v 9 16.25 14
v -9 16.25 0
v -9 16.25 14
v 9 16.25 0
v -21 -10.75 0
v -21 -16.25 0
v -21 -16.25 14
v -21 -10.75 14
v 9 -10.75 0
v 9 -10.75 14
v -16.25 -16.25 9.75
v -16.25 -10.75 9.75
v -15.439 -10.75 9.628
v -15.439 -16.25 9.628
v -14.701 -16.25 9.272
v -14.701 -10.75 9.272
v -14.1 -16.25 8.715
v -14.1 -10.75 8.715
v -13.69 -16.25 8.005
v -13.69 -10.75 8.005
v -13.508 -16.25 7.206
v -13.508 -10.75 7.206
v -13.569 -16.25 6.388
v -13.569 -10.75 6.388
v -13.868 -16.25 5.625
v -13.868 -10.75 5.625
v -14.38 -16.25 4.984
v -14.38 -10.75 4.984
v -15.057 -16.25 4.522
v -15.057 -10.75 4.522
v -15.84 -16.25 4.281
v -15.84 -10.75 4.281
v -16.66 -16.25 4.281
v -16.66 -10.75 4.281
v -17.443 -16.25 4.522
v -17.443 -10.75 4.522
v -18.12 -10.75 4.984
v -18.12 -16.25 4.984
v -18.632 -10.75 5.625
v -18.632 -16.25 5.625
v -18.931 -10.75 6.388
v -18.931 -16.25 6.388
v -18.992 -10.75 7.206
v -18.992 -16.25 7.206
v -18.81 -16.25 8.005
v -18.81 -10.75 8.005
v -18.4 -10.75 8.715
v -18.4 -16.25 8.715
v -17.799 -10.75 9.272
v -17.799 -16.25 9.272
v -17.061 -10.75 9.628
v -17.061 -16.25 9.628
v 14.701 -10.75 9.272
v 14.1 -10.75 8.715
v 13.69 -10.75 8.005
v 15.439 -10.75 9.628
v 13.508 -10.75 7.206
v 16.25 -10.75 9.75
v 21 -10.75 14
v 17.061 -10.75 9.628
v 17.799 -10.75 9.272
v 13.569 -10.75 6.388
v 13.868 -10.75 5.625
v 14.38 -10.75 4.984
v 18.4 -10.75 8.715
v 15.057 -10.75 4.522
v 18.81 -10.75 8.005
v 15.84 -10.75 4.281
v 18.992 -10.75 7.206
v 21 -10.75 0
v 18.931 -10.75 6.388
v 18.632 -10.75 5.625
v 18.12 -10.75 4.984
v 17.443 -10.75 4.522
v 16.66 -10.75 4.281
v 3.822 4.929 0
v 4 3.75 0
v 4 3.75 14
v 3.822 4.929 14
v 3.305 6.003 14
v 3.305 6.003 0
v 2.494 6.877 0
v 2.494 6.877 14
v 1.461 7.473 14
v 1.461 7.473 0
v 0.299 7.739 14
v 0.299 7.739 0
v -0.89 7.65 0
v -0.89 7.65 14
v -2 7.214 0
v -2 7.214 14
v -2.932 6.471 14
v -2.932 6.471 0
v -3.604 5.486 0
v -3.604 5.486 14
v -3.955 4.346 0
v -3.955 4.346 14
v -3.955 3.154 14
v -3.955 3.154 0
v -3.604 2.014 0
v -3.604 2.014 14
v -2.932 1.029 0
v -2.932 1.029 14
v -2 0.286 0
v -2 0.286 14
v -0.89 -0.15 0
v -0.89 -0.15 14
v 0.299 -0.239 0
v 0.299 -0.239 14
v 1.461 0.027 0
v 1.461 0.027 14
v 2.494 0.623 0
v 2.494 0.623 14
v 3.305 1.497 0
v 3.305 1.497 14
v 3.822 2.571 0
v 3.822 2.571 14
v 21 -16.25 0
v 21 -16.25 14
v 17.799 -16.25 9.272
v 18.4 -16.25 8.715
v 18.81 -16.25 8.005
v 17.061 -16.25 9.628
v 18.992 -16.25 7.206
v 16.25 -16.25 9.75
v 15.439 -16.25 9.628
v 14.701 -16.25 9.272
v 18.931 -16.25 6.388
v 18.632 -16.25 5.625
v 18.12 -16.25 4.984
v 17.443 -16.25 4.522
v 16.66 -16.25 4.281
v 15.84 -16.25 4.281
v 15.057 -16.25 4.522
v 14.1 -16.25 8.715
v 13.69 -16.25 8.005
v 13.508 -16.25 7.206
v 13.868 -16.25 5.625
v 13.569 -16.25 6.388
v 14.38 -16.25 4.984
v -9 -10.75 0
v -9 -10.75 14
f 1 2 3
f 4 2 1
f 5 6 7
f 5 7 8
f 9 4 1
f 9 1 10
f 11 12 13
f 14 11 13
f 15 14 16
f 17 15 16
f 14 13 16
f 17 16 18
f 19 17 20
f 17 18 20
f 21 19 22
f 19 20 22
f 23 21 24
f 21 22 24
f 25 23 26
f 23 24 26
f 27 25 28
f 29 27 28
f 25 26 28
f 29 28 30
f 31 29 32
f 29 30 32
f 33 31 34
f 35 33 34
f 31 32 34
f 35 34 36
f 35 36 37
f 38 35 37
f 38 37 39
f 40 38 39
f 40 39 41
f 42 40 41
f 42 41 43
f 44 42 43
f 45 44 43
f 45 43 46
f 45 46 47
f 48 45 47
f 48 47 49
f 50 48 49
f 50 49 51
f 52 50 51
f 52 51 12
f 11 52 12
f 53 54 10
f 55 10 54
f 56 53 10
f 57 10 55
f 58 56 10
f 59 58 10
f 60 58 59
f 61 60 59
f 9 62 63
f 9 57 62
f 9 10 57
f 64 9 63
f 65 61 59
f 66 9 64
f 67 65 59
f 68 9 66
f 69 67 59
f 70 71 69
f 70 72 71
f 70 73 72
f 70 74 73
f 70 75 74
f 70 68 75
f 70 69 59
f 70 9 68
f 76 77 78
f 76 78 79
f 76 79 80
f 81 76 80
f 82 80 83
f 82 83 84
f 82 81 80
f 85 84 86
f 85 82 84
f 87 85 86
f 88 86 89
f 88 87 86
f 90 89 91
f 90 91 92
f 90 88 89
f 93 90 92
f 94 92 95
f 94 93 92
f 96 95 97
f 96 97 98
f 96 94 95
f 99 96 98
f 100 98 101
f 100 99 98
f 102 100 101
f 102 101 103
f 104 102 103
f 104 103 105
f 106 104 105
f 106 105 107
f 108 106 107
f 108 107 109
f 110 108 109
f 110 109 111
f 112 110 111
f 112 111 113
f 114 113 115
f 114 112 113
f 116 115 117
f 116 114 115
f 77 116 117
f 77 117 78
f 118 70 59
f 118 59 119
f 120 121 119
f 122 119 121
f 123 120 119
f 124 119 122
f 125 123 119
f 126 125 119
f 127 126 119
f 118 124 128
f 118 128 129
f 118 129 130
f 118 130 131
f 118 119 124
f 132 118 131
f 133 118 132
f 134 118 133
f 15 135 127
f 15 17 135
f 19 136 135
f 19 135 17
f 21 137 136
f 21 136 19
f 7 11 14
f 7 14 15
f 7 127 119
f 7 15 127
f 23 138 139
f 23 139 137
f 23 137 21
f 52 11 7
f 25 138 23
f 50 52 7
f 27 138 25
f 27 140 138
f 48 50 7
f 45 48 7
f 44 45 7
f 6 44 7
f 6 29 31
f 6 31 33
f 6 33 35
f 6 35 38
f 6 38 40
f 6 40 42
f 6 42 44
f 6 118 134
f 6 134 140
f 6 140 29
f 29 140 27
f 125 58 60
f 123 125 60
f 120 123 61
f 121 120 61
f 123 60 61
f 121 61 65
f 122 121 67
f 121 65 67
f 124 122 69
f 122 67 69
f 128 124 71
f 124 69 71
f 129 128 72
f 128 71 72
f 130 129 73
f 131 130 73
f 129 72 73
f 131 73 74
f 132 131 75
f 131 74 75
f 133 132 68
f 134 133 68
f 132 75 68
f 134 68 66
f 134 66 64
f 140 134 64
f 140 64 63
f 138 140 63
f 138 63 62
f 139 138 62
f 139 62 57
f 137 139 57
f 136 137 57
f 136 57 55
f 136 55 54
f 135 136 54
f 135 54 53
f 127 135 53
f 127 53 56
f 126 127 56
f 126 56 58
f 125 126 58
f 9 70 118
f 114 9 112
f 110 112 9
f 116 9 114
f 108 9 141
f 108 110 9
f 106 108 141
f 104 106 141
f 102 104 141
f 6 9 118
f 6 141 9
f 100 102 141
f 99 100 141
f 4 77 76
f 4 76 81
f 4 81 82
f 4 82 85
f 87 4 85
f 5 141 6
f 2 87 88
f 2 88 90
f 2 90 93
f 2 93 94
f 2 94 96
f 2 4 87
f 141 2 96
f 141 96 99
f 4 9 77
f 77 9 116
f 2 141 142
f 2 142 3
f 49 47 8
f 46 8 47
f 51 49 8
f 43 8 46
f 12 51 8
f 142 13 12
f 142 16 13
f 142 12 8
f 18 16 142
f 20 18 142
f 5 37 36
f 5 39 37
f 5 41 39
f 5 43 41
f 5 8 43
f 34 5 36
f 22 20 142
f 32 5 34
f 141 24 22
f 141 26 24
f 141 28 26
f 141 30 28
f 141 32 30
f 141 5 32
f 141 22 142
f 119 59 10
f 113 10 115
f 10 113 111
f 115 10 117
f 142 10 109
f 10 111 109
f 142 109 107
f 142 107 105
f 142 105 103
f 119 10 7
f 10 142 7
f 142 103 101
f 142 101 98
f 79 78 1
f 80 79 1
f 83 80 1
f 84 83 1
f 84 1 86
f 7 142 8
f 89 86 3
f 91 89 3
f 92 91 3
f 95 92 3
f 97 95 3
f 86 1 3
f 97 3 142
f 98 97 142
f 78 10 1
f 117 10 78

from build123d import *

# Parameters (mm, degrees)
SKETCH_1_R          = 4
EXTRUDE_1_DEPTH     = 14
SKETCH_2_R          = 2.75
CUT_EXTRUDE_1_DEPTH = 14


with BuildPart() as part:
    # 草图1 → 凸台-拉伸1 (new body)
    with BuildSketch(Plane.XY):
        Polygon((-21, -10.75), (-9, -10.75), (-9, 16.25), (9, 16.25), (9, -10.75), (21, -10.75), (21, -16.25), (-21, -16.25), align=None)
        with Locations((0, 3.75)):
            Circle(SKETCH_1_R, mode=Mode.SUBTRACT)
    extrude(amount=EXTRUDE_1_DEPTH)

    # 草图2 → 切除-拉伸1 (cut)
    with BuildSketch(Plane(origin=(0, -10.75, 0), x_dir=(1, 0, 0), z_dir=(0, 1, 0))):
        with Locations(Location((-16.25, -7, 0), (0, 0, 270))):
            Circle(SKETCH_2_R)
        with Locations(Location((16.25, -7, 0), (0, 0, 270))):
            Circle(SKETCH_2_R)
    extrude(amount=-CUT_EXTRUDE_1_DEPTH, mode=Mode.SUBTRACT)


solid = part.part
